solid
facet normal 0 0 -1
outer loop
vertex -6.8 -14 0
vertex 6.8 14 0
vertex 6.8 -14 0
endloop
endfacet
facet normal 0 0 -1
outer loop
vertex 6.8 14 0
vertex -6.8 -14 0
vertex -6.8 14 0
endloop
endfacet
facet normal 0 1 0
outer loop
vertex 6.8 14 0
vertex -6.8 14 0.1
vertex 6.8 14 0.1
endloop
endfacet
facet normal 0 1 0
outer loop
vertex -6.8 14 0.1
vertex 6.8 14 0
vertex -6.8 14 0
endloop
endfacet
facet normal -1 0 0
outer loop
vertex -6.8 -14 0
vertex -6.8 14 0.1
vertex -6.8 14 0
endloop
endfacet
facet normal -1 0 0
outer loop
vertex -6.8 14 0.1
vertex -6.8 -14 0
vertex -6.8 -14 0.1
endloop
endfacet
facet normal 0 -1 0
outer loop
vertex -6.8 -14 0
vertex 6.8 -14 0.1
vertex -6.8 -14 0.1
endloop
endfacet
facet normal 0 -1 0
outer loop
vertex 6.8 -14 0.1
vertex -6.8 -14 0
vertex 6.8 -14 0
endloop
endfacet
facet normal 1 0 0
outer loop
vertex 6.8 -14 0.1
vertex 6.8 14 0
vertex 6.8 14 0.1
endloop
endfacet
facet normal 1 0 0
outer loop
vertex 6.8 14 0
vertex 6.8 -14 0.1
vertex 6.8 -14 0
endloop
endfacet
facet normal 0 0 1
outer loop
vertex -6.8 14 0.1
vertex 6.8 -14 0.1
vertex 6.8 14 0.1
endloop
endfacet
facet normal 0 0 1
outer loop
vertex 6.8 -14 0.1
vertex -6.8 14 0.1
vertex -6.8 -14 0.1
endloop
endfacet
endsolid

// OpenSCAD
// file: ../p/box5-12.scad
use <../lib.scad>
function ldraw_lib__box5_12() = [
// 0 Box with 5 Faces without Any Edges
// 0 Name: box5-12.dat
// 0 Author: Chris Dee [cwdee]
// 0 !LDRAW_ORG Primitive UPDATE 2009-02
// 0 !LICENSE Licensed under CC BY 2.0 and CC BY 4.0 : see CAreadme.txt
// 
// 0 BFC CERTIFY CCW
  [0,"BFC","CERTIFY"],
  [0,"BFC","CCW"],
// 
// 0 !HISTORY 2009-09-03 [PTadmin] Official Update 2009-02
// 
// 
// 4 16 1 1 1 1 1 -1 -1 1 -1 -1 1 1
  [4,16,1,1,1,1,1,-1,-1,1,-1,-1,1,1],
// 4 16 -1 0 1 1 0 1 1 1 1 -1 1 1
  [4,16,-1,0,1,1,0,1,1,1,1,-1,1,1],
// 4 16 -1 0 -1 -1 0 1 -1 1 1 -1 1 -1
  [4,16,-1,0,-1,-1,0,1,-1,1,1,-1,1,-1],
// 4 16 1 0 -1 -1 0 -1 -1 1 -1 1 1 -1
  [4,16,1,0,-1,-1,0,-1,-1,1,-1,1,1,-1],
// 4 16 1 0 1 1 0 -1 1 1 -1 1 1 1
  [4,16,1,0,1,1,0,-1,1,1,-1,1,1,1],
// 0
];
module ldraw_lib__box5_12(step=0, col=false, unit=2/5, alt=false, line=0.2, solid=!$preview)
    makepoly(ldraw_lib__box5_12(), step=step, col=col, unit=unit, alt=alt, line=line, solid=solid);
ldraw_lib__box5_12(line=0.2);
// main file
use <../lib.scad>
use <../p/box5-12.scad>
function ldraw_lib__u9480() = [
// 0 ~Sticker for Electric Motor 4.5V
// 0 Name: u9480.dat
// 0 Author: Alex Taylor [anathema]
// 0 !LDRAW_ORG Part UPDATE 2022-02
// 0 !LICENSE Licensed under CC BY 2.0 and CC BY 4.0 : see CAreadme.txt
// 
// 0 BFC CERTIFY CCW
  [0,"BFC","CERTIFY"],
  [0,"BFC","CCW"],
// 
// 0 !HISTORY 2022-03-06 [PTadmin] Official Update 2022-02
// 
// 
// 1 16 0 -0.25 0 17 0 0 0 0.25 0 0 0 35 box5-12.dat
  [1,16,0,-0.25,0,17,0,0,0,0.25,0,0,0,35, ldraw_lib__box5_12()],
// 0 !TEXMAP START PLANAR -17 -0.25 35 17 -0.25 35 -17 -0.25 -35 u9480.png
// 0 !: 4 16 -17 -0.25 -35 17 -0.25 -35 17 -0.25 35 -17 -0.25 35
// 0 !TEXMAP FALLBACK
// 4 15 -17 -0.25 -35 17 -0.25 -35 17 -0.25 35 -17 -0.25 35
  [4,15,-17,-0.25,-35,17,-0.25,-35,17,-0.25,35,-17,-0.25,35],
// 0 !TEXMAP END
];
module ldraw_lib__u9480(step=0, col=false, unit=2/5, alt=false, line=0.2, solid=!$preview)
    makepoly(ldraw_lib__u9480(), step=step, col=col, unit=unit, alt=alt, line=line, solid=solid);
ldraw_lib__u9480(line=0.2);
